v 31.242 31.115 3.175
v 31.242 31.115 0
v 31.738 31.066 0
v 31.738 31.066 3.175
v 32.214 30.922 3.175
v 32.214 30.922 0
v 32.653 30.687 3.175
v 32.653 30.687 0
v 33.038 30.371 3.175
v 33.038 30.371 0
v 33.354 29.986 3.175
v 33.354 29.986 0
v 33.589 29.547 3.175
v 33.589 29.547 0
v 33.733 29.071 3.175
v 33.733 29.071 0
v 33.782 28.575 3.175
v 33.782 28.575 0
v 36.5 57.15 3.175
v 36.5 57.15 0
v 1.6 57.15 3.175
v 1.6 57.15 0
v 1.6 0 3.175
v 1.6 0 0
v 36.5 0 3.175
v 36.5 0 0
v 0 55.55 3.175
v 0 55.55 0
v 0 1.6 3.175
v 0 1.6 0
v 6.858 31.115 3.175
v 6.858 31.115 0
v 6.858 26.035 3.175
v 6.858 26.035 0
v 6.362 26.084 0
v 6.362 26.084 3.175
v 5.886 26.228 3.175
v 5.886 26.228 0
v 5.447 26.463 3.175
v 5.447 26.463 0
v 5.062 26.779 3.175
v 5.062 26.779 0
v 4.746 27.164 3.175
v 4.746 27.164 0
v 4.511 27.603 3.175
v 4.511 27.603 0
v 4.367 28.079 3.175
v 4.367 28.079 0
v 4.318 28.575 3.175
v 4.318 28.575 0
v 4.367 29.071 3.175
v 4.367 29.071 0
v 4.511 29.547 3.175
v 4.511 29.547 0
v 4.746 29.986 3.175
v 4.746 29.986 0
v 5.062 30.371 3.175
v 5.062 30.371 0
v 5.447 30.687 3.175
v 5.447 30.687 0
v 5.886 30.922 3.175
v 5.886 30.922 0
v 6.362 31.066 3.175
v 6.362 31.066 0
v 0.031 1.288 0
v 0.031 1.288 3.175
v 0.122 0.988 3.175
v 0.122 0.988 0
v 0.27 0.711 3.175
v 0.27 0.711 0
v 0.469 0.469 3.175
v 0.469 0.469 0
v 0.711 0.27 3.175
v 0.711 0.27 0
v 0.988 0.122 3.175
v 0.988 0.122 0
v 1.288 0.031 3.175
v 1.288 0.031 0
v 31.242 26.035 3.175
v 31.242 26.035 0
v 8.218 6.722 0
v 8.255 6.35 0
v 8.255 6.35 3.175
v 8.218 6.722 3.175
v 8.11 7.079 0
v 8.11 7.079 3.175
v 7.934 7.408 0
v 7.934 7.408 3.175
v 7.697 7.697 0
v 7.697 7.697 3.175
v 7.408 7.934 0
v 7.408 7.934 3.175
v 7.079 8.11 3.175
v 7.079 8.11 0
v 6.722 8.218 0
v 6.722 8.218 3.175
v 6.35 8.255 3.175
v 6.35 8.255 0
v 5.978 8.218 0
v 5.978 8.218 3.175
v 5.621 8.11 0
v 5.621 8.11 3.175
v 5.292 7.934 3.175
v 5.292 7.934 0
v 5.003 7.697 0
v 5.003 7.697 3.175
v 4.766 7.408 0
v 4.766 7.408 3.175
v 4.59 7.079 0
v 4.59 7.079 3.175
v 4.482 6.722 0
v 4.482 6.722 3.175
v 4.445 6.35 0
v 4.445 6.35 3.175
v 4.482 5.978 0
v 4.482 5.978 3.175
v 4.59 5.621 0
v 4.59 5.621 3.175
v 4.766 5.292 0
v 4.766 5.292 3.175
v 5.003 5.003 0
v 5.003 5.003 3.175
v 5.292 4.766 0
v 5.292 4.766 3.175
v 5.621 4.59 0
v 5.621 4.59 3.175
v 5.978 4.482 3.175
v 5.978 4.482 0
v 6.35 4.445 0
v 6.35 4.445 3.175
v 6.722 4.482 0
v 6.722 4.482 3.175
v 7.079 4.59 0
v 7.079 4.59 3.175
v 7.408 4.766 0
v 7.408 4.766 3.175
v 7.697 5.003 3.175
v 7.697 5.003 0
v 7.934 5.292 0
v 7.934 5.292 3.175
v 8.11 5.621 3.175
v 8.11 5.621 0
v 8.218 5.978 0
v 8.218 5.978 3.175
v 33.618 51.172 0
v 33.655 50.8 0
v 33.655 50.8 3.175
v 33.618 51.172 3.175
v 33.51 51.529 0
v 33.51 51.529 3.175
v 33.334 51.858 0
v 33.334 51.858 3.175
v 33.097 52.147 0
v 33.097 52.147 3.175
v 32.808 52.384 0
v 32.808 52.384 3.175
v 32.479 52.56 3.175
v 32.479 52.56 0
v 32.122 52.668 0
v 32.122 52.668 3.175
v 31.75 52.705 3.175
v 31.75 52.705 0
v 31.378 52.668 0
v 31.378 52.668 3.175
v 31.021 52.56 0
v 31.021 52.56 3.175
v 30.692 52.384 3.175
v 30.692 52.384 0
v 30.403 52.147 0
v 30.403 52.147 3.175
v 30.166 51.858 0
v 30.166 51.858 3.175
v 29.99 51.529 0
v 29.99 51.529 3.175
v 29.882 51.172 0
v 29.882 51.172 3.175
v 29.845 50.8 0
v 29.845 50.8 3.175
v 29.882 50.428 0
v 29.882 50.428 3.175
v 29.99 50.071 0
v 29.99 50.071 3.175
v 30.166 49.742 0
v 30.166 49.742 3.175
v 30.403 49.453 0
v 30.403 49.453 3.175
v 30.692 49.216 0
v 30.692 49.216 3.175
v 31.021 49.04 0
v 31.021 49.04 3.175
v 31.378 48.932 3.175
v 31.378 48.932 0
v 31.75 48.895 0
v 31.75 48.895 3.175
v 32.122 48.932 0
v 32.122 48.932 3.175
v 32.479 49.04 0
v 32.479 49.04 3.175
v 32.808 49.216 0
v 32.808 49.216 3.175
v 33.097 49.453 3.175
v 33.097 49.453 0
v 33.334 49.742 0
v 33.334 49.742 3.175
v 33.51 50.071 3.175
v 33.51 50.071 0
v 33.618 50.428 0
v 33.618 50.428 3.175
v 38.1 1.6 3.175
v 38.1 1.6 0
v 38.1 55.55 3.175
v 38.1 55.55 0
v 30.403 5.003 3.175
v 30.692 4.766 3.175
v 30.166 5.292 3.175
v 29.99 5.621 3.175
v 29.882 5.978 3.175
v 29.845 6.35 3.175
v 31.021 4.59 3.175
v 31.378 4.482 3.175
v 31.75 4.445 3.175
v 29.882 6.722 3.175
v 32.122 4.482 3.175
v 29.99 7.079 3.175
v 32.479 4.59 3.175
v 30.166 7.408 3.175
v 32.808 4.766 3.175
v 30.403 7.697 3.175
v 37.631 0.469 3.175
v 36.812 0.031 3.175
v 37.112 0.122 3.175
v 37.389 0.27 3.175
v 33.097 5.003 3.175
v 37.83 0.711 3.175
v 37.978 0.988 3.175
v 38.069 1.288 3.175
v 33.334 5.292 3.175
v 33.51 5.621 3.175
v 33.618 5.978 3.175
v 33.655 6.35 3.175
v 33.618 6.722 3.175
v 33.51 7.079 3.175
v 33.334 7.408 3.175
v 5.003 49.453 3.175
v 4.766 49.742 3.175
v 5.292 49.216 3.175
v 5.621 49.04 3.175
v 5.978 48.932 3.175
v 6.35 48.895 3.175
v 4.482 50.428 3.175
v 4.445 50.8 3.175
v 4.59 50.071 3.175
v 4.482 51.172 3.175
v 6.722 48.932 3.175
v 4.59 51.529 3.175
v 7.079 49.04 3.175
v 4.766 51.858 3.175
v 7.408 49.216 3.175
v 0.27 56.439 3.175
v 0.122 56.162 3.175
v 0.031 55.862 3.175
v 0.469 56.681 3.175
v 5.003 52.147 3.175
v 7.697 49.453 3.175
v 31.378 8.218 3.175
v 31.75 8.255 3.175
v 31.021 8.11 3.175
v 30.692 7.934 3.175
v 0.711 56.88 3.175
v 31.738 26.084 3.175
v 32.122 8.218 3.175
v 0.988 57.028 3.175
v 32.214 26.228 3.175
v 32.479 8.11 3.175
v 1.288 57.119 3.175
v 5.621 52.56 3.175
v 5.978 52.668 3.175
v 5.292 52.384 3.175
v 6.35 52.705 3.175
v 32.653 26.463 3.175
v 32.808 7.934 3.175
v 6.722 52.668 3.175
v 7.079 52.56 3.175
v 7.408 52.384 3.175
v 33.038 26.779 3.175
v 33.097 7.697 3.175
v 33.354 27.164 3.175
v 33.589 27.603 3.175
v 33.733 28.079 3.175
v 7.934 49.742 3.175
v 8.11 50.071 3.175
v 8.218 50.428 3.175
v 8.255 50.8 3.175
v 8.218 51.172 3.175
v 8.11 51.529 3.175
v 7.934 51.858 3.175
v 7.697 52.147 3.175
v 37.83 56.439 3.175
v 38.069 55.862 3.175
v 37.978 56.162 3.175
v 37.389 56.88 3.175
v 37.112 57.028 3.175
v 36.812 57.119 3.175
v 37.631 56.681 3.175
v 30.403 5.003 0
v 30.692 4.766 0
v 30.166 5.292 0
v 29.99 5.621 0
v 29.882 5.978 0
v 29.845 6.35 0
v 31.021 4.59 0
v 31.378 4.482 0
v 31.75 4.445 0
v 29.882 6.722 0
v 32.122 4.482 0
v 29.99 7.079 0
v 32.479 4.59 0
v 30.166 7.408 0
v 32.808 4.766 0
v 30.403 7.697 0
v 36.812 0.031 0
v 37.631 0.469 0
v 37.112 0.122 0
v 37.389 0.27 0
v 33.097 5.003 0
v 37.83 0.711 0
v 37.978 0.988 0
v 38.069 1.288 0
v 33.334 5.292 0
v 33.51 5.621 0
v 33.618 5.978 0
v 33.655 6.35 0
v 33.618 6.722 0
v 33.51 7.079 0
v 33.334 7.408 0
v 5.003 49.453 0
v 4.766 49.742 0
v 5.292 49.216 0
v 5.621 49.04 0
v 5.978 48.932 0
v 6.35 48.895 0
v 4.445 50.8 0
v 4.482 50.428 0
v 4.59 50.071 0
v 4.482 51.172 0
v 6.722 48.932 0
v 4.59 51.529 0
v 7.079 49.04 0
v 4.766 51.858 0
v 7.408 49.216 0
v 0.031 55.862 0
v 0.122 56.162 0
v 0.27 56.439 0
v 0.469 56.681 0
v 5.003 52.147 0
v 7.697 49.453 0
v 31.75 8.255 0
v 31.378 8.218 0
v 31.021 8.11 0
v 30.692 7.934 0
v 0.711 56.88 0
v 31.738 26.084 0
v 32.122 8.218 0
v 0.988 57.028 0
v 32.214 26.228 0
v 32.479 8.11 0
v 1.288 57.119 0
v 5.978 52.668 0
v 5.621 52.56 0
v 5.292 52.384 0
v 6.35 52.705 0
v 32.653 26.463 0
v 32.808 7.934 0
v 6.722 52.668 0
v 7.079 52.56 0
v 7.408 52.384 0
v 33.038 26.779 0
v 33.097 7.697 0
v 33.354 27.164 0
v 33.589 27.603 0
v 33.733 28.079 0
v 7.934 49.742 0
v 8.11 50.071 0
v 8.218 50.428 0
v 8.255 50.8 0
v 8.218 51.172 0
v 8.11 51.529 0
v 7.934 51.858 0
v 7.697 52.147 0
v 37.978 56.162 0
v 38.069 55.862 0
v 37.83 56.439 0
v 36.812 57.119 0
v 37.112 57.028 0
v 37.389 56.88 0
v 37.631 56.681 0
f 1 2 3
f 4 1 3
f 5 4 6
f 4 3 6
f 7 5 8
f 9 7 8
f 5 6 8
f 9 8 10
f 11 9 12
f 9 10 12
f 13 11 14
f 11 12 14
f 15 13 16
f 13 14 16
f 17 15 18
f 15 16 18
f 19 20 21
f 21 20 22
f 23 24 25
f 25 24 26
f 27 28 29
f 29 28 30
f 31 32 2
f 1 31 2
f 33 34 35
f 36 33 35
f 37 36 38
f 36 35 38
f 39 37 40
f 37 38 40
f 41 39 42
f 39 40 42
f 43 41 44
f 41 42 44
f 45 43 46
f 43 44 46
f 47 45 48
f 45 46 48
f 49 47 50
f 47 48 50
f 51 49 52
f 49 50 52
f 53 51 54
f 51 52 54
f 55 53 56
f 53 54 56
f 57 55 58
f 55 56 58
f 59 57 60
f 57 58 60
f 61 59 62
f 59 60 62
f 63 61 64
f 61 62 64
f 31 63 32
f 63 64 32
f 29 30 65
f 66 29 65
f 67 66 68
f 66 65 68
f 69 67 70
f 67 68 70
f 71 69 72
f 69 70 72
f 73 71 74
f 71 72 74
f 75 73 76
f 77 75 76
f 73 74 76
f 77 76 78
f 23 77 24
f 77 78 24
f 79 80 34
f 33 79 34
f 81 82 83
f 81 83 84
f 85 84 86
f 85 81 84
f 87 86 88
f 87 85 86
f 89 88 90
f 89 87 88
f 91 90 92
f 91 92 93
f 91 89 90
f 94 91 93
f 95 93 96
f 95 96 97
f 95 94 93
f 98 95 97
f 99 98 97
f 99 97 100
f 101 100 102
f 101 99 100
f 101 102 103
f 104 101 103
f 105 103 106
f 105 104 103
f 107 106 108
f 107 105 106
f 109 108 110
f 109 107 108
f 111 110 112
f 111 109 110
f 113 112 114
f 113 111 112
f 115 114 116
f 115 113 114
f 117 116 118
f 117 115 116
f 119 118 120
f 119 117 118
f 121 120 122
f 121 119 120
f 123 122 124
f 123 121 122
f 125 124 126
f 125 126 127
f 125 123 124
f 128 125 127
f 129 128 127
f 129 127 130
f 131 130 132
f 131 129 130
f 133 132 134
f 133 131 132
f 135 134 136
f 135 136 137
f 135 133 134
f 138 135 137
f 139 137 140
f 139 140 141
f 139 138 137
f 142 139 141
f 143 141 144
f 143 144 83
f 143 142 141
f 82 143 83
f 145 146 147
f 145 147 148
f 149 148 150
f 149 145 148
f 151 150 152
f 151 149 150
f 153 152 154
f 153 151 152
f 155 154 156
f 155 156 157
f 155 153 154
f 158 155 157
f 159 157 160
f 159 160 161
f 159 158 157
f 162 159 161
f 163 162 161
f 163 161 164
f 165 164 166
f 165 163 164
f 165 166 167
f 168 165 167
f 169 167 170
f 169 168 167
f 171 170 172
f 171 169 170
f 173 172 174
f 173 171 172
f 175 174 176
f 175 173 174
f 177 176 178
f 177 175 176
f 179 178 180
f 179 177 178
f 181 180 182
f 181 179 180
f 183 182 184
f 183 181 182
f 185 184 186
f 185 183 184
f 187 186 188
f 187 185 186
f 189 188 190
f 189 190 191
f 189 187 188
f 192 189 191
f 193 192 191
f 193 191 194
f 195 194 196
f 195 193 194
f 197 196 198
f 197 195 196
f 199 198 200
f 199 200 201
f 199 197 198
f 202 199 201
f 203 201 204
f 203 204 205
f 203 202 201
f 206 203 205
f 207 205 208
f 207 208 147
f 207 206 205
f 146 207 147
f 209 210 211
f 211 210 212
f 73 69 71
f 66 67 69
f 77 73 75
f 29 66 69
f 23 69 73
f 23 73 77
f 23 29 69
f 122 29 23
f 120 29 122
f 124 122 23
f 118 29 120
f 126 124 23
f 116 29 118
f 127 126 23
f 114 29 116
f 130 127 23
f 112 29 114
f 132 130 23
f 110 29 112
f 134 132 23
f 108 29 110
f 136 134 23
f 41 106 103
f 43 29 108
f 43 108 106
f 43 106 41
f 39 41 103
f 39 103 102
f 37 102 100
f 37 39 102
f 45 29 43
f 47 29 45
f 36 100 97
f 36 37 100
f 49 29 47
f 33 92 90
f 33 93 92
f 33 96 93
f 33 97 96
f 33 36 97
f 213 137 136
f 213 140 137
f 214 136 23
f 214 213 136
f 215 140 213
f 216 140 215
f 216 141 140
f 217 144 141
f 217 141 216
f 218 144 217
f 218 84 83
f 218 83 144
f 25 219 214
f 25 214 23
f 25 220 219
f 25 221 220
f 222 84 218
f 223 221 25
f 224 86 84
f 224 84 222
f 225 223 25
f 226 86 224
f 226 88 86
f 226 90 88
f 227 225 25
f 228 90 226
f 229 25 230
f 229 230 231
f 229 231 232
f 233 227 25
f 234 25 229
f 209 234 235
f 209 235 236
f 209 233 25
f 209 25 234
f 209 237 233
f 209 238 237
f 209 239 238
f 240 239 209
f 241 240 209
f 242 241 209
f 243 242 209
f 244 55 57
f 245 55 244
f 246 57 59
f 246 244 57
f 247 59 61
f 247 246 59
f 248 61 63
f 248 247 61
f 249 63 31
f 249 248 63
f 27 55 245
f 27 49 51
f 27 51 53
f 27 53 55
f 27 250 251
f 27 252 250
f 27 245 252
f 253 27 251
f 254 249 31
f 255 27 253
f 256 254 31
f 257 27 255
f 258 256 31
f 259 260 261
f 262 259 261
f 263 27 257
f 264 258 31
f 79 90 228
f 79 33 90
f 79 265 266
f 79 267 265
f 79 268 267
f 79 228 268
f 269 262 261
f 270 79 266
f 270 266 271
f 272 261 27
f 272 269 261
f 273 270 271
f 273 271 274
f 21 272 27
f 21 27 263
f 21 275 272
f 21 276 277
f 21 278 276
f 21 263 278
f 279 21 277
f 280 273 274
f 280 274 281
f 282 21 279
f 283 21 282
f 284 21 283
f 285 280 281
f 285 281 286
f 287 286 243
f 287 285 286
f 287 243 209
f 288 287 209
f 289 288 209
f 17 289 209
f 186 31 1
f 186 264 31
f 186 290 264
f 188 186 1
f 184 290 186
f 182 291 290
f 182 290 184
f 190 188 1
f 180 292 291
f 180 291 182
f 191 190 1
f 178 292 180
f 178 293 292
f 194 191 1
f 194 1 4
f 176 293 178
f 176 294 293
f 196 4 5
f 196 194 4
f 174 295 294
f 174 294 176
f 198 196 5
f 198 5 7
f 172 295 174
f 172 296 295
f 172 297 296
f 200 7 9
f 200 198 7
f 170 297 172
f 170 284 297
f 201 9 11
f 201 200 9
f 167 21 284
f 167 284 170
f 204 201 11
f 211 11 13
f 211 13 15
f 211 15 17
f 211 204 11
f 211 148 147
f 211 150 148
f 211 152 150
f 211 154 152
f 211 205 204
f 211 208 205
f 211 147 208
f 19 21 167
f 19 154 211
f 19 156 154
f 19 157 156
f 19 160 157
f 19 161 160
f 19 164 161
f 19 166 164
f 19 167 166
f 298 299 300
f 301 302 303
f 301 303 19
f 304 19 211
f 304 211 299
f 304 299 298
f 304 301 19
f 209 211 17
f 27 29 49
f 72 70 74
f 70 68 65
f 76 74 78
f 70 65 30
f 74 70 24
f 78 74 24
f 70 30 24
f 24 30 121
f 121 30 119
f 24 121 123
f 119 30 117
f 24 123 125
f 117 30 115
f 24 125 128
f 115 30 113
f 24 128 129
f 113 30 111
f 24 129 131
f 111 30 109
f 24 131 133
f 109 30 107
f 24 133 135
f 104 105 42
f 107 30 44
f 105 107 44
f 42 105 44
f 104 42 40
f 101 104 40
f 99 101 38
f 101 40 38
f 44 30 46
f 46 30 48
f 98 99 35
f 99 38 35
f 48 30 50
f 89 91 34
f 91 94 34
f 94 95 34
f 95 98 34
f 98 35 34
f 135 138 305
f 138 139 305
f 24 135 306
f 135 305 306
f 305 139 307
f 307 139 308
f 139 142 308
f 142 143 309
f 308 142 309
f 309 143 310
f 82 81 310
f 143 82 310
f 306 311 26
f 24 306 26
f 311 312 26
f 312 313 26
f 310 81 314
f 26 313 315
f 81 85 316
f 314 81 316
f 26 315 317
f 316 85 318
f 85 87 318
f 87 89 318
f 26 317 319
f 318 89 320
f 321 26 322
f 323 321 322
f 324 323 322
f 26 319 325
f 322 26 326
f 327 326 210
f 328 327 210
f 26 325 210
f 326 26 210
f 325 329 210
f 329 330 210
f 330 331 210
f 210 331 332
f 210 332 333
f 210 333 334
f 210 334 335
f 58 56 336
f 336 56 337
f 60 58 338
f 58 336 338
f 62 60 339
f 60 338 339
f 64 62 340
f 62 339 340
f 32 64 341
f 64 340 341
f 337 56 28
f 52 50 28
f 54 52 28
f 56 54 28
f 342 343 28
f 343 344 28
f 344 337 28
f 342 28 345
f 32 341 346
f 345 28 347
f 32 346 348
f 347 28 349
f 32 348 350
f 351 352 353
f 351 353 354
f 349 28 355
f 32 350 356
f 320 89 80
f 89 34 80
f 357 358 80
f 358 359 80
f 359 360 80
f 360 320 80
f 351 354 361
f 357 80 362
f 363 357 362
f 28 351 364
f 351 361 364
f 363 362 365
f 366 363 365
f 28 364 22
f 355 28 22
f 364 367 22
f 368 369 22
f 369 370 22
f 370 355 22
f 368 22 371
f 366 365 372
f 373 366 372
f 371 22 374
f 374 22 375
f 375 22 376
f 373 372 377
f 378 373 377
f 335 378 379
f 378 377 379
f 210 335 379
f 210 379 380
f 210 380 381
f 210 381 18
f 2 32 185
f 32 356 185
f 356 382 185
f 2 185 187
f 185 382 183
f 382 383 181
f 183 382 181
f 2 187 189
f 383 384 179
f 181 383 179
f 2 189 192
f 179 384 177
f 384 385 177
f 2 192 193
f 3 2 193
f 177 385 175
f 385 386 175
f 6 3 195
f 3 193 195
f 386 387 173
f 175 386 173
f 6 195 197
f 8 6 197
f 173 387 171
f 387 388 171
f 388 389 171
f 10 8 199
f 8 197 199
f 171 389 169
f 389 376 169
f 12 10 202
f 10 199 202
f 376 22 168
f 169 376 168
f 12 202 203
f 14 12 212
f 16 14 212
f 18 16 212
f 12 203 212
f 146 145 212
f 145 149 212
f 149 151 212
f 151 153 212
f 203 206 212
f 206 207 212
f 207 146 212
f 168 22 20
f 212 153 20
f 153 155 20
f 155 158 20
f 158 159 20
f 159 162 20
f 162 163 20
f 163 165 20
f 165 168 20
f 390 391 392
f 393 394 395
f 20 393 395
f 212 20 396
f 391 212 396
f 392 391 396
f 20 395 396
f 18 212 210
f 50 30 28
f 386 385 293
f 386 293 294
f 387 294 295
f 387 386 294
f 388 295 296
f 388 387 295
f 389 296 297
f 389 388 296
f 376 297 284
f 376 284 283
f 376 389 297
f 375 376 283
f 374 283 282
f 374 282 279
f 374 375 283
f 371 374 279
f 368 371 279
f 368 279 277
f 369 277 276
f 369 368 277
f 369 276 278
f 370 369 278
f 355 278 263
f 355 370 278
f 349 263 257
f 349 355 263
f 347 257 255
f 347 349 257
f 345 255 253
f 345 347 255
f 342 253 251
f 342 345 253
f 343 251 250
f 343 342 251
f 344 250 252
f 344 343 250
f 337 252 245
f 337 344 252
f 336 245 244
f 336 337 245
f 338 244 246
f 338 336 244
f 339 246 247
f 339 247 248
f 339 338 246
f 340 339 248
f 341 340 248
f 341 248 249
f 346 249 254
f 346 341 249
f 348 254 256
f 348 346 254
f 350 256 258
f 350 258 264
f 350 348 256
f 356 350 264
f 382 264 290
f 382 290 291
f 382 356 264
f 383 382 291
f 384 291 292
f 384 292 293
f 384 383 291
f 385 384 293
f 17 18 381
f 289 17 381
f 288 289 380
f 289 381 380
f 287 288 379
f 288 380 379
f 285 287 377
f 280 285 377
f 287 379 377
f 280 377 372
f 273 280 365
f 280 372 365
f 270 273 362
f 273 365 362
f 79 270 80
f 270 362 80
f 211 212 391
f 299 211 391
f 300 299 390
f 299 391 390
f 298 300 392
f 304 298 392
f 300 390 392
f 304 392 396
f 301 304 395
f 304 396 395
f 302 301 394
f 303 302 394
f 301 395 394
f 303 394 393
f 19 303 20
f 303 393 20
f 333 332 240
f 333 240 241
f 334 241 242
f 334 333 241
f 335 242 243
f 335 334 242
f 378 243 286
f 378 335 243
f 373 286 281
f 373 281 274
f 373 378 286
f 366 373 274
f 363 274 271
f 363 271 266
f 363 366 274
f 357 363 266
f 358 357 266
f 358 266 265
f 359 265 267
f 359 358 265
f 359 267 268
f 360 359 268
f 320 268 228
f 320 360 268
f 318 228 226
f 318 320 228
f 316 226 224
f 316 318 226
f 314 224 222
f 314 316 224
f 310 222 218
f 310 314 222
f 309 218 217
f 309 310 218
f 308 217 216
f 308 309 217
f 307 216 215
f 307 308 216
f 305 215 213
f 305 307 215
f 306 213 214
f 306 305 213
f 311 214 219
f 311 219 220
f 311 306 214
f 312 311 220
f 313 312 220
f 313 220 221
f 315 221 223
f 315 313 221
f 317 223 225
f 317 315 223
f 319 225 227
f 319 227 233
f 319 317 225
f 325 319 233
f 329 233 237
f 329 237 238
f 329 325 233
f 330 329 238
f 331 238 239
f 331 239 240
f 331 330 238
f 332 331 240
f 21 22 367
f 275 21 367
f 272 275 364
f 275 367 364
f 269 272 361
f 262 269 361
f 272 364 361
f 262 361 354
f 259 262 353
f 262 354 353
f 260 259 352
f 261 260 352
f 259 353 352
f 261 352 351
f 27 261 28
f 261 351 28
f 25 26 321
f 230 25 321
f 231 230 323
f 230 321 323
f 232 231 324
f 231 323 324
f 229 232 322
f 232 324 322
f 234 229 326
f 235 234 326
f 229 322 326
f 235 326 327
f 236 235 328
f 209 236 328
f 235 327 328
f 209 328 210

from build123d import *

# Parameters (mm, degrees)
F0_R     = 1.905
F1_DEPTH = 3.175


with BuildPart() as f1:
    # F0 (on Top) → F1 (new body)
    with BuildSketch(Plane.XY):
        with BuildLine():
            ThreePointArc((0, 1.6002), (0.468688, 0.468688), (1.6002, 0))
            Line((1.6002, 0), (36.4998, 0))
            ThreePointArc((36.4998, 0), (37.631312, 0.468688), (38.1, 1.6002))
            Line((38.1, 1.6002), (38.1, 55.5498))
            ThreePointArc((38.1, 55.5498), (37.631312, 56.681312), (36.4998, 57.15))
            Line((36.4998, 57.15), (1.6002, 57.15))
            ThreePointArc((1.6002, 57.15), (0.468688, 56.681312), (0, 55.5498))
            Line((0, 55.5498), (0, 1.6002))
        make_face()
        with Locations((6.35, 6.35)):
            Circle(F0_R, mode=Mode.SUBTRACT)
        with Locations((31.75, 6.35)):
            Circle(F0_R, mode=Mode.SUBTRACT)
        with Locations((6.35, 50.8)):
            Circle(F0_R, mode=Mode.SUBTRACT)
        with BuildLine():
            ThreePointArc((6.858, 26.035), (4.318, 28.575), (6.858, 31.115))
            Line((6.858, 31.115), (31.242, 31.115))
            ThreePointArc((31.242, 31.115), (33.038051, 30.371051), (33.782, 28.575))
            ThreePointArc((33.782, 28.575), (33.038051, 26.778949), (31.242, 26.035))
            Line((31.242, 26.035), (6.858, 26.035))
        make_face(mode=Mode.SUBTRACT)
        with Locations((31.75, 50.8)):
            Circle(F0_R, mode=Mode.SUBTRACT)
    extrude(amount=F1_DEPTH)


solid = f1.part
